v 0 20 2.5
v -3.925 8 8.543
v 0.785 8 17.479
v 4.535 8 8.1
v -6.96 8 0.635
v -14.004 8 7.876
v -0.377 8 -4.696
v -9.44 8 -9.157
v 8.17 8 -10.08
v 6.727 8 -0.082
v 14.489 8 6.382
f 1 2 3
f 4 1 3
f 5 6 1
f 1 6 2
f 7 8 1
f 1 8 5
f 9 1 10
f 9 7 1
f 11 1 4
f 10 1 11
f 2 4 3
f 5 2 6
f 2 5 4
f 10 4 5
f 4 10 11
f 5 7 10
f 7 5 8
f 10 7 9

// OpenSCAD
module star(numberOfPoints, pointLength, width, height) {
    difference() {
        union() {
            for (i=[1:numberOfPoints]) {
                rotate([0, 0, 360/numberOfPoints*i])
                rotate([0,90,0])
                //scale([1,1,1])
                cylinder(h=pointLength, r1=width*1.5, r2=0, $fn=3);
            }
        }
        translate([0,0,width/2])
        cube(center=true, [pointLength*2+5, pointLength*2+5, width]);
    }
}

translate([0,8,2.5])
rotate([90,-15,0])
star(5, 15, 8, 3);
